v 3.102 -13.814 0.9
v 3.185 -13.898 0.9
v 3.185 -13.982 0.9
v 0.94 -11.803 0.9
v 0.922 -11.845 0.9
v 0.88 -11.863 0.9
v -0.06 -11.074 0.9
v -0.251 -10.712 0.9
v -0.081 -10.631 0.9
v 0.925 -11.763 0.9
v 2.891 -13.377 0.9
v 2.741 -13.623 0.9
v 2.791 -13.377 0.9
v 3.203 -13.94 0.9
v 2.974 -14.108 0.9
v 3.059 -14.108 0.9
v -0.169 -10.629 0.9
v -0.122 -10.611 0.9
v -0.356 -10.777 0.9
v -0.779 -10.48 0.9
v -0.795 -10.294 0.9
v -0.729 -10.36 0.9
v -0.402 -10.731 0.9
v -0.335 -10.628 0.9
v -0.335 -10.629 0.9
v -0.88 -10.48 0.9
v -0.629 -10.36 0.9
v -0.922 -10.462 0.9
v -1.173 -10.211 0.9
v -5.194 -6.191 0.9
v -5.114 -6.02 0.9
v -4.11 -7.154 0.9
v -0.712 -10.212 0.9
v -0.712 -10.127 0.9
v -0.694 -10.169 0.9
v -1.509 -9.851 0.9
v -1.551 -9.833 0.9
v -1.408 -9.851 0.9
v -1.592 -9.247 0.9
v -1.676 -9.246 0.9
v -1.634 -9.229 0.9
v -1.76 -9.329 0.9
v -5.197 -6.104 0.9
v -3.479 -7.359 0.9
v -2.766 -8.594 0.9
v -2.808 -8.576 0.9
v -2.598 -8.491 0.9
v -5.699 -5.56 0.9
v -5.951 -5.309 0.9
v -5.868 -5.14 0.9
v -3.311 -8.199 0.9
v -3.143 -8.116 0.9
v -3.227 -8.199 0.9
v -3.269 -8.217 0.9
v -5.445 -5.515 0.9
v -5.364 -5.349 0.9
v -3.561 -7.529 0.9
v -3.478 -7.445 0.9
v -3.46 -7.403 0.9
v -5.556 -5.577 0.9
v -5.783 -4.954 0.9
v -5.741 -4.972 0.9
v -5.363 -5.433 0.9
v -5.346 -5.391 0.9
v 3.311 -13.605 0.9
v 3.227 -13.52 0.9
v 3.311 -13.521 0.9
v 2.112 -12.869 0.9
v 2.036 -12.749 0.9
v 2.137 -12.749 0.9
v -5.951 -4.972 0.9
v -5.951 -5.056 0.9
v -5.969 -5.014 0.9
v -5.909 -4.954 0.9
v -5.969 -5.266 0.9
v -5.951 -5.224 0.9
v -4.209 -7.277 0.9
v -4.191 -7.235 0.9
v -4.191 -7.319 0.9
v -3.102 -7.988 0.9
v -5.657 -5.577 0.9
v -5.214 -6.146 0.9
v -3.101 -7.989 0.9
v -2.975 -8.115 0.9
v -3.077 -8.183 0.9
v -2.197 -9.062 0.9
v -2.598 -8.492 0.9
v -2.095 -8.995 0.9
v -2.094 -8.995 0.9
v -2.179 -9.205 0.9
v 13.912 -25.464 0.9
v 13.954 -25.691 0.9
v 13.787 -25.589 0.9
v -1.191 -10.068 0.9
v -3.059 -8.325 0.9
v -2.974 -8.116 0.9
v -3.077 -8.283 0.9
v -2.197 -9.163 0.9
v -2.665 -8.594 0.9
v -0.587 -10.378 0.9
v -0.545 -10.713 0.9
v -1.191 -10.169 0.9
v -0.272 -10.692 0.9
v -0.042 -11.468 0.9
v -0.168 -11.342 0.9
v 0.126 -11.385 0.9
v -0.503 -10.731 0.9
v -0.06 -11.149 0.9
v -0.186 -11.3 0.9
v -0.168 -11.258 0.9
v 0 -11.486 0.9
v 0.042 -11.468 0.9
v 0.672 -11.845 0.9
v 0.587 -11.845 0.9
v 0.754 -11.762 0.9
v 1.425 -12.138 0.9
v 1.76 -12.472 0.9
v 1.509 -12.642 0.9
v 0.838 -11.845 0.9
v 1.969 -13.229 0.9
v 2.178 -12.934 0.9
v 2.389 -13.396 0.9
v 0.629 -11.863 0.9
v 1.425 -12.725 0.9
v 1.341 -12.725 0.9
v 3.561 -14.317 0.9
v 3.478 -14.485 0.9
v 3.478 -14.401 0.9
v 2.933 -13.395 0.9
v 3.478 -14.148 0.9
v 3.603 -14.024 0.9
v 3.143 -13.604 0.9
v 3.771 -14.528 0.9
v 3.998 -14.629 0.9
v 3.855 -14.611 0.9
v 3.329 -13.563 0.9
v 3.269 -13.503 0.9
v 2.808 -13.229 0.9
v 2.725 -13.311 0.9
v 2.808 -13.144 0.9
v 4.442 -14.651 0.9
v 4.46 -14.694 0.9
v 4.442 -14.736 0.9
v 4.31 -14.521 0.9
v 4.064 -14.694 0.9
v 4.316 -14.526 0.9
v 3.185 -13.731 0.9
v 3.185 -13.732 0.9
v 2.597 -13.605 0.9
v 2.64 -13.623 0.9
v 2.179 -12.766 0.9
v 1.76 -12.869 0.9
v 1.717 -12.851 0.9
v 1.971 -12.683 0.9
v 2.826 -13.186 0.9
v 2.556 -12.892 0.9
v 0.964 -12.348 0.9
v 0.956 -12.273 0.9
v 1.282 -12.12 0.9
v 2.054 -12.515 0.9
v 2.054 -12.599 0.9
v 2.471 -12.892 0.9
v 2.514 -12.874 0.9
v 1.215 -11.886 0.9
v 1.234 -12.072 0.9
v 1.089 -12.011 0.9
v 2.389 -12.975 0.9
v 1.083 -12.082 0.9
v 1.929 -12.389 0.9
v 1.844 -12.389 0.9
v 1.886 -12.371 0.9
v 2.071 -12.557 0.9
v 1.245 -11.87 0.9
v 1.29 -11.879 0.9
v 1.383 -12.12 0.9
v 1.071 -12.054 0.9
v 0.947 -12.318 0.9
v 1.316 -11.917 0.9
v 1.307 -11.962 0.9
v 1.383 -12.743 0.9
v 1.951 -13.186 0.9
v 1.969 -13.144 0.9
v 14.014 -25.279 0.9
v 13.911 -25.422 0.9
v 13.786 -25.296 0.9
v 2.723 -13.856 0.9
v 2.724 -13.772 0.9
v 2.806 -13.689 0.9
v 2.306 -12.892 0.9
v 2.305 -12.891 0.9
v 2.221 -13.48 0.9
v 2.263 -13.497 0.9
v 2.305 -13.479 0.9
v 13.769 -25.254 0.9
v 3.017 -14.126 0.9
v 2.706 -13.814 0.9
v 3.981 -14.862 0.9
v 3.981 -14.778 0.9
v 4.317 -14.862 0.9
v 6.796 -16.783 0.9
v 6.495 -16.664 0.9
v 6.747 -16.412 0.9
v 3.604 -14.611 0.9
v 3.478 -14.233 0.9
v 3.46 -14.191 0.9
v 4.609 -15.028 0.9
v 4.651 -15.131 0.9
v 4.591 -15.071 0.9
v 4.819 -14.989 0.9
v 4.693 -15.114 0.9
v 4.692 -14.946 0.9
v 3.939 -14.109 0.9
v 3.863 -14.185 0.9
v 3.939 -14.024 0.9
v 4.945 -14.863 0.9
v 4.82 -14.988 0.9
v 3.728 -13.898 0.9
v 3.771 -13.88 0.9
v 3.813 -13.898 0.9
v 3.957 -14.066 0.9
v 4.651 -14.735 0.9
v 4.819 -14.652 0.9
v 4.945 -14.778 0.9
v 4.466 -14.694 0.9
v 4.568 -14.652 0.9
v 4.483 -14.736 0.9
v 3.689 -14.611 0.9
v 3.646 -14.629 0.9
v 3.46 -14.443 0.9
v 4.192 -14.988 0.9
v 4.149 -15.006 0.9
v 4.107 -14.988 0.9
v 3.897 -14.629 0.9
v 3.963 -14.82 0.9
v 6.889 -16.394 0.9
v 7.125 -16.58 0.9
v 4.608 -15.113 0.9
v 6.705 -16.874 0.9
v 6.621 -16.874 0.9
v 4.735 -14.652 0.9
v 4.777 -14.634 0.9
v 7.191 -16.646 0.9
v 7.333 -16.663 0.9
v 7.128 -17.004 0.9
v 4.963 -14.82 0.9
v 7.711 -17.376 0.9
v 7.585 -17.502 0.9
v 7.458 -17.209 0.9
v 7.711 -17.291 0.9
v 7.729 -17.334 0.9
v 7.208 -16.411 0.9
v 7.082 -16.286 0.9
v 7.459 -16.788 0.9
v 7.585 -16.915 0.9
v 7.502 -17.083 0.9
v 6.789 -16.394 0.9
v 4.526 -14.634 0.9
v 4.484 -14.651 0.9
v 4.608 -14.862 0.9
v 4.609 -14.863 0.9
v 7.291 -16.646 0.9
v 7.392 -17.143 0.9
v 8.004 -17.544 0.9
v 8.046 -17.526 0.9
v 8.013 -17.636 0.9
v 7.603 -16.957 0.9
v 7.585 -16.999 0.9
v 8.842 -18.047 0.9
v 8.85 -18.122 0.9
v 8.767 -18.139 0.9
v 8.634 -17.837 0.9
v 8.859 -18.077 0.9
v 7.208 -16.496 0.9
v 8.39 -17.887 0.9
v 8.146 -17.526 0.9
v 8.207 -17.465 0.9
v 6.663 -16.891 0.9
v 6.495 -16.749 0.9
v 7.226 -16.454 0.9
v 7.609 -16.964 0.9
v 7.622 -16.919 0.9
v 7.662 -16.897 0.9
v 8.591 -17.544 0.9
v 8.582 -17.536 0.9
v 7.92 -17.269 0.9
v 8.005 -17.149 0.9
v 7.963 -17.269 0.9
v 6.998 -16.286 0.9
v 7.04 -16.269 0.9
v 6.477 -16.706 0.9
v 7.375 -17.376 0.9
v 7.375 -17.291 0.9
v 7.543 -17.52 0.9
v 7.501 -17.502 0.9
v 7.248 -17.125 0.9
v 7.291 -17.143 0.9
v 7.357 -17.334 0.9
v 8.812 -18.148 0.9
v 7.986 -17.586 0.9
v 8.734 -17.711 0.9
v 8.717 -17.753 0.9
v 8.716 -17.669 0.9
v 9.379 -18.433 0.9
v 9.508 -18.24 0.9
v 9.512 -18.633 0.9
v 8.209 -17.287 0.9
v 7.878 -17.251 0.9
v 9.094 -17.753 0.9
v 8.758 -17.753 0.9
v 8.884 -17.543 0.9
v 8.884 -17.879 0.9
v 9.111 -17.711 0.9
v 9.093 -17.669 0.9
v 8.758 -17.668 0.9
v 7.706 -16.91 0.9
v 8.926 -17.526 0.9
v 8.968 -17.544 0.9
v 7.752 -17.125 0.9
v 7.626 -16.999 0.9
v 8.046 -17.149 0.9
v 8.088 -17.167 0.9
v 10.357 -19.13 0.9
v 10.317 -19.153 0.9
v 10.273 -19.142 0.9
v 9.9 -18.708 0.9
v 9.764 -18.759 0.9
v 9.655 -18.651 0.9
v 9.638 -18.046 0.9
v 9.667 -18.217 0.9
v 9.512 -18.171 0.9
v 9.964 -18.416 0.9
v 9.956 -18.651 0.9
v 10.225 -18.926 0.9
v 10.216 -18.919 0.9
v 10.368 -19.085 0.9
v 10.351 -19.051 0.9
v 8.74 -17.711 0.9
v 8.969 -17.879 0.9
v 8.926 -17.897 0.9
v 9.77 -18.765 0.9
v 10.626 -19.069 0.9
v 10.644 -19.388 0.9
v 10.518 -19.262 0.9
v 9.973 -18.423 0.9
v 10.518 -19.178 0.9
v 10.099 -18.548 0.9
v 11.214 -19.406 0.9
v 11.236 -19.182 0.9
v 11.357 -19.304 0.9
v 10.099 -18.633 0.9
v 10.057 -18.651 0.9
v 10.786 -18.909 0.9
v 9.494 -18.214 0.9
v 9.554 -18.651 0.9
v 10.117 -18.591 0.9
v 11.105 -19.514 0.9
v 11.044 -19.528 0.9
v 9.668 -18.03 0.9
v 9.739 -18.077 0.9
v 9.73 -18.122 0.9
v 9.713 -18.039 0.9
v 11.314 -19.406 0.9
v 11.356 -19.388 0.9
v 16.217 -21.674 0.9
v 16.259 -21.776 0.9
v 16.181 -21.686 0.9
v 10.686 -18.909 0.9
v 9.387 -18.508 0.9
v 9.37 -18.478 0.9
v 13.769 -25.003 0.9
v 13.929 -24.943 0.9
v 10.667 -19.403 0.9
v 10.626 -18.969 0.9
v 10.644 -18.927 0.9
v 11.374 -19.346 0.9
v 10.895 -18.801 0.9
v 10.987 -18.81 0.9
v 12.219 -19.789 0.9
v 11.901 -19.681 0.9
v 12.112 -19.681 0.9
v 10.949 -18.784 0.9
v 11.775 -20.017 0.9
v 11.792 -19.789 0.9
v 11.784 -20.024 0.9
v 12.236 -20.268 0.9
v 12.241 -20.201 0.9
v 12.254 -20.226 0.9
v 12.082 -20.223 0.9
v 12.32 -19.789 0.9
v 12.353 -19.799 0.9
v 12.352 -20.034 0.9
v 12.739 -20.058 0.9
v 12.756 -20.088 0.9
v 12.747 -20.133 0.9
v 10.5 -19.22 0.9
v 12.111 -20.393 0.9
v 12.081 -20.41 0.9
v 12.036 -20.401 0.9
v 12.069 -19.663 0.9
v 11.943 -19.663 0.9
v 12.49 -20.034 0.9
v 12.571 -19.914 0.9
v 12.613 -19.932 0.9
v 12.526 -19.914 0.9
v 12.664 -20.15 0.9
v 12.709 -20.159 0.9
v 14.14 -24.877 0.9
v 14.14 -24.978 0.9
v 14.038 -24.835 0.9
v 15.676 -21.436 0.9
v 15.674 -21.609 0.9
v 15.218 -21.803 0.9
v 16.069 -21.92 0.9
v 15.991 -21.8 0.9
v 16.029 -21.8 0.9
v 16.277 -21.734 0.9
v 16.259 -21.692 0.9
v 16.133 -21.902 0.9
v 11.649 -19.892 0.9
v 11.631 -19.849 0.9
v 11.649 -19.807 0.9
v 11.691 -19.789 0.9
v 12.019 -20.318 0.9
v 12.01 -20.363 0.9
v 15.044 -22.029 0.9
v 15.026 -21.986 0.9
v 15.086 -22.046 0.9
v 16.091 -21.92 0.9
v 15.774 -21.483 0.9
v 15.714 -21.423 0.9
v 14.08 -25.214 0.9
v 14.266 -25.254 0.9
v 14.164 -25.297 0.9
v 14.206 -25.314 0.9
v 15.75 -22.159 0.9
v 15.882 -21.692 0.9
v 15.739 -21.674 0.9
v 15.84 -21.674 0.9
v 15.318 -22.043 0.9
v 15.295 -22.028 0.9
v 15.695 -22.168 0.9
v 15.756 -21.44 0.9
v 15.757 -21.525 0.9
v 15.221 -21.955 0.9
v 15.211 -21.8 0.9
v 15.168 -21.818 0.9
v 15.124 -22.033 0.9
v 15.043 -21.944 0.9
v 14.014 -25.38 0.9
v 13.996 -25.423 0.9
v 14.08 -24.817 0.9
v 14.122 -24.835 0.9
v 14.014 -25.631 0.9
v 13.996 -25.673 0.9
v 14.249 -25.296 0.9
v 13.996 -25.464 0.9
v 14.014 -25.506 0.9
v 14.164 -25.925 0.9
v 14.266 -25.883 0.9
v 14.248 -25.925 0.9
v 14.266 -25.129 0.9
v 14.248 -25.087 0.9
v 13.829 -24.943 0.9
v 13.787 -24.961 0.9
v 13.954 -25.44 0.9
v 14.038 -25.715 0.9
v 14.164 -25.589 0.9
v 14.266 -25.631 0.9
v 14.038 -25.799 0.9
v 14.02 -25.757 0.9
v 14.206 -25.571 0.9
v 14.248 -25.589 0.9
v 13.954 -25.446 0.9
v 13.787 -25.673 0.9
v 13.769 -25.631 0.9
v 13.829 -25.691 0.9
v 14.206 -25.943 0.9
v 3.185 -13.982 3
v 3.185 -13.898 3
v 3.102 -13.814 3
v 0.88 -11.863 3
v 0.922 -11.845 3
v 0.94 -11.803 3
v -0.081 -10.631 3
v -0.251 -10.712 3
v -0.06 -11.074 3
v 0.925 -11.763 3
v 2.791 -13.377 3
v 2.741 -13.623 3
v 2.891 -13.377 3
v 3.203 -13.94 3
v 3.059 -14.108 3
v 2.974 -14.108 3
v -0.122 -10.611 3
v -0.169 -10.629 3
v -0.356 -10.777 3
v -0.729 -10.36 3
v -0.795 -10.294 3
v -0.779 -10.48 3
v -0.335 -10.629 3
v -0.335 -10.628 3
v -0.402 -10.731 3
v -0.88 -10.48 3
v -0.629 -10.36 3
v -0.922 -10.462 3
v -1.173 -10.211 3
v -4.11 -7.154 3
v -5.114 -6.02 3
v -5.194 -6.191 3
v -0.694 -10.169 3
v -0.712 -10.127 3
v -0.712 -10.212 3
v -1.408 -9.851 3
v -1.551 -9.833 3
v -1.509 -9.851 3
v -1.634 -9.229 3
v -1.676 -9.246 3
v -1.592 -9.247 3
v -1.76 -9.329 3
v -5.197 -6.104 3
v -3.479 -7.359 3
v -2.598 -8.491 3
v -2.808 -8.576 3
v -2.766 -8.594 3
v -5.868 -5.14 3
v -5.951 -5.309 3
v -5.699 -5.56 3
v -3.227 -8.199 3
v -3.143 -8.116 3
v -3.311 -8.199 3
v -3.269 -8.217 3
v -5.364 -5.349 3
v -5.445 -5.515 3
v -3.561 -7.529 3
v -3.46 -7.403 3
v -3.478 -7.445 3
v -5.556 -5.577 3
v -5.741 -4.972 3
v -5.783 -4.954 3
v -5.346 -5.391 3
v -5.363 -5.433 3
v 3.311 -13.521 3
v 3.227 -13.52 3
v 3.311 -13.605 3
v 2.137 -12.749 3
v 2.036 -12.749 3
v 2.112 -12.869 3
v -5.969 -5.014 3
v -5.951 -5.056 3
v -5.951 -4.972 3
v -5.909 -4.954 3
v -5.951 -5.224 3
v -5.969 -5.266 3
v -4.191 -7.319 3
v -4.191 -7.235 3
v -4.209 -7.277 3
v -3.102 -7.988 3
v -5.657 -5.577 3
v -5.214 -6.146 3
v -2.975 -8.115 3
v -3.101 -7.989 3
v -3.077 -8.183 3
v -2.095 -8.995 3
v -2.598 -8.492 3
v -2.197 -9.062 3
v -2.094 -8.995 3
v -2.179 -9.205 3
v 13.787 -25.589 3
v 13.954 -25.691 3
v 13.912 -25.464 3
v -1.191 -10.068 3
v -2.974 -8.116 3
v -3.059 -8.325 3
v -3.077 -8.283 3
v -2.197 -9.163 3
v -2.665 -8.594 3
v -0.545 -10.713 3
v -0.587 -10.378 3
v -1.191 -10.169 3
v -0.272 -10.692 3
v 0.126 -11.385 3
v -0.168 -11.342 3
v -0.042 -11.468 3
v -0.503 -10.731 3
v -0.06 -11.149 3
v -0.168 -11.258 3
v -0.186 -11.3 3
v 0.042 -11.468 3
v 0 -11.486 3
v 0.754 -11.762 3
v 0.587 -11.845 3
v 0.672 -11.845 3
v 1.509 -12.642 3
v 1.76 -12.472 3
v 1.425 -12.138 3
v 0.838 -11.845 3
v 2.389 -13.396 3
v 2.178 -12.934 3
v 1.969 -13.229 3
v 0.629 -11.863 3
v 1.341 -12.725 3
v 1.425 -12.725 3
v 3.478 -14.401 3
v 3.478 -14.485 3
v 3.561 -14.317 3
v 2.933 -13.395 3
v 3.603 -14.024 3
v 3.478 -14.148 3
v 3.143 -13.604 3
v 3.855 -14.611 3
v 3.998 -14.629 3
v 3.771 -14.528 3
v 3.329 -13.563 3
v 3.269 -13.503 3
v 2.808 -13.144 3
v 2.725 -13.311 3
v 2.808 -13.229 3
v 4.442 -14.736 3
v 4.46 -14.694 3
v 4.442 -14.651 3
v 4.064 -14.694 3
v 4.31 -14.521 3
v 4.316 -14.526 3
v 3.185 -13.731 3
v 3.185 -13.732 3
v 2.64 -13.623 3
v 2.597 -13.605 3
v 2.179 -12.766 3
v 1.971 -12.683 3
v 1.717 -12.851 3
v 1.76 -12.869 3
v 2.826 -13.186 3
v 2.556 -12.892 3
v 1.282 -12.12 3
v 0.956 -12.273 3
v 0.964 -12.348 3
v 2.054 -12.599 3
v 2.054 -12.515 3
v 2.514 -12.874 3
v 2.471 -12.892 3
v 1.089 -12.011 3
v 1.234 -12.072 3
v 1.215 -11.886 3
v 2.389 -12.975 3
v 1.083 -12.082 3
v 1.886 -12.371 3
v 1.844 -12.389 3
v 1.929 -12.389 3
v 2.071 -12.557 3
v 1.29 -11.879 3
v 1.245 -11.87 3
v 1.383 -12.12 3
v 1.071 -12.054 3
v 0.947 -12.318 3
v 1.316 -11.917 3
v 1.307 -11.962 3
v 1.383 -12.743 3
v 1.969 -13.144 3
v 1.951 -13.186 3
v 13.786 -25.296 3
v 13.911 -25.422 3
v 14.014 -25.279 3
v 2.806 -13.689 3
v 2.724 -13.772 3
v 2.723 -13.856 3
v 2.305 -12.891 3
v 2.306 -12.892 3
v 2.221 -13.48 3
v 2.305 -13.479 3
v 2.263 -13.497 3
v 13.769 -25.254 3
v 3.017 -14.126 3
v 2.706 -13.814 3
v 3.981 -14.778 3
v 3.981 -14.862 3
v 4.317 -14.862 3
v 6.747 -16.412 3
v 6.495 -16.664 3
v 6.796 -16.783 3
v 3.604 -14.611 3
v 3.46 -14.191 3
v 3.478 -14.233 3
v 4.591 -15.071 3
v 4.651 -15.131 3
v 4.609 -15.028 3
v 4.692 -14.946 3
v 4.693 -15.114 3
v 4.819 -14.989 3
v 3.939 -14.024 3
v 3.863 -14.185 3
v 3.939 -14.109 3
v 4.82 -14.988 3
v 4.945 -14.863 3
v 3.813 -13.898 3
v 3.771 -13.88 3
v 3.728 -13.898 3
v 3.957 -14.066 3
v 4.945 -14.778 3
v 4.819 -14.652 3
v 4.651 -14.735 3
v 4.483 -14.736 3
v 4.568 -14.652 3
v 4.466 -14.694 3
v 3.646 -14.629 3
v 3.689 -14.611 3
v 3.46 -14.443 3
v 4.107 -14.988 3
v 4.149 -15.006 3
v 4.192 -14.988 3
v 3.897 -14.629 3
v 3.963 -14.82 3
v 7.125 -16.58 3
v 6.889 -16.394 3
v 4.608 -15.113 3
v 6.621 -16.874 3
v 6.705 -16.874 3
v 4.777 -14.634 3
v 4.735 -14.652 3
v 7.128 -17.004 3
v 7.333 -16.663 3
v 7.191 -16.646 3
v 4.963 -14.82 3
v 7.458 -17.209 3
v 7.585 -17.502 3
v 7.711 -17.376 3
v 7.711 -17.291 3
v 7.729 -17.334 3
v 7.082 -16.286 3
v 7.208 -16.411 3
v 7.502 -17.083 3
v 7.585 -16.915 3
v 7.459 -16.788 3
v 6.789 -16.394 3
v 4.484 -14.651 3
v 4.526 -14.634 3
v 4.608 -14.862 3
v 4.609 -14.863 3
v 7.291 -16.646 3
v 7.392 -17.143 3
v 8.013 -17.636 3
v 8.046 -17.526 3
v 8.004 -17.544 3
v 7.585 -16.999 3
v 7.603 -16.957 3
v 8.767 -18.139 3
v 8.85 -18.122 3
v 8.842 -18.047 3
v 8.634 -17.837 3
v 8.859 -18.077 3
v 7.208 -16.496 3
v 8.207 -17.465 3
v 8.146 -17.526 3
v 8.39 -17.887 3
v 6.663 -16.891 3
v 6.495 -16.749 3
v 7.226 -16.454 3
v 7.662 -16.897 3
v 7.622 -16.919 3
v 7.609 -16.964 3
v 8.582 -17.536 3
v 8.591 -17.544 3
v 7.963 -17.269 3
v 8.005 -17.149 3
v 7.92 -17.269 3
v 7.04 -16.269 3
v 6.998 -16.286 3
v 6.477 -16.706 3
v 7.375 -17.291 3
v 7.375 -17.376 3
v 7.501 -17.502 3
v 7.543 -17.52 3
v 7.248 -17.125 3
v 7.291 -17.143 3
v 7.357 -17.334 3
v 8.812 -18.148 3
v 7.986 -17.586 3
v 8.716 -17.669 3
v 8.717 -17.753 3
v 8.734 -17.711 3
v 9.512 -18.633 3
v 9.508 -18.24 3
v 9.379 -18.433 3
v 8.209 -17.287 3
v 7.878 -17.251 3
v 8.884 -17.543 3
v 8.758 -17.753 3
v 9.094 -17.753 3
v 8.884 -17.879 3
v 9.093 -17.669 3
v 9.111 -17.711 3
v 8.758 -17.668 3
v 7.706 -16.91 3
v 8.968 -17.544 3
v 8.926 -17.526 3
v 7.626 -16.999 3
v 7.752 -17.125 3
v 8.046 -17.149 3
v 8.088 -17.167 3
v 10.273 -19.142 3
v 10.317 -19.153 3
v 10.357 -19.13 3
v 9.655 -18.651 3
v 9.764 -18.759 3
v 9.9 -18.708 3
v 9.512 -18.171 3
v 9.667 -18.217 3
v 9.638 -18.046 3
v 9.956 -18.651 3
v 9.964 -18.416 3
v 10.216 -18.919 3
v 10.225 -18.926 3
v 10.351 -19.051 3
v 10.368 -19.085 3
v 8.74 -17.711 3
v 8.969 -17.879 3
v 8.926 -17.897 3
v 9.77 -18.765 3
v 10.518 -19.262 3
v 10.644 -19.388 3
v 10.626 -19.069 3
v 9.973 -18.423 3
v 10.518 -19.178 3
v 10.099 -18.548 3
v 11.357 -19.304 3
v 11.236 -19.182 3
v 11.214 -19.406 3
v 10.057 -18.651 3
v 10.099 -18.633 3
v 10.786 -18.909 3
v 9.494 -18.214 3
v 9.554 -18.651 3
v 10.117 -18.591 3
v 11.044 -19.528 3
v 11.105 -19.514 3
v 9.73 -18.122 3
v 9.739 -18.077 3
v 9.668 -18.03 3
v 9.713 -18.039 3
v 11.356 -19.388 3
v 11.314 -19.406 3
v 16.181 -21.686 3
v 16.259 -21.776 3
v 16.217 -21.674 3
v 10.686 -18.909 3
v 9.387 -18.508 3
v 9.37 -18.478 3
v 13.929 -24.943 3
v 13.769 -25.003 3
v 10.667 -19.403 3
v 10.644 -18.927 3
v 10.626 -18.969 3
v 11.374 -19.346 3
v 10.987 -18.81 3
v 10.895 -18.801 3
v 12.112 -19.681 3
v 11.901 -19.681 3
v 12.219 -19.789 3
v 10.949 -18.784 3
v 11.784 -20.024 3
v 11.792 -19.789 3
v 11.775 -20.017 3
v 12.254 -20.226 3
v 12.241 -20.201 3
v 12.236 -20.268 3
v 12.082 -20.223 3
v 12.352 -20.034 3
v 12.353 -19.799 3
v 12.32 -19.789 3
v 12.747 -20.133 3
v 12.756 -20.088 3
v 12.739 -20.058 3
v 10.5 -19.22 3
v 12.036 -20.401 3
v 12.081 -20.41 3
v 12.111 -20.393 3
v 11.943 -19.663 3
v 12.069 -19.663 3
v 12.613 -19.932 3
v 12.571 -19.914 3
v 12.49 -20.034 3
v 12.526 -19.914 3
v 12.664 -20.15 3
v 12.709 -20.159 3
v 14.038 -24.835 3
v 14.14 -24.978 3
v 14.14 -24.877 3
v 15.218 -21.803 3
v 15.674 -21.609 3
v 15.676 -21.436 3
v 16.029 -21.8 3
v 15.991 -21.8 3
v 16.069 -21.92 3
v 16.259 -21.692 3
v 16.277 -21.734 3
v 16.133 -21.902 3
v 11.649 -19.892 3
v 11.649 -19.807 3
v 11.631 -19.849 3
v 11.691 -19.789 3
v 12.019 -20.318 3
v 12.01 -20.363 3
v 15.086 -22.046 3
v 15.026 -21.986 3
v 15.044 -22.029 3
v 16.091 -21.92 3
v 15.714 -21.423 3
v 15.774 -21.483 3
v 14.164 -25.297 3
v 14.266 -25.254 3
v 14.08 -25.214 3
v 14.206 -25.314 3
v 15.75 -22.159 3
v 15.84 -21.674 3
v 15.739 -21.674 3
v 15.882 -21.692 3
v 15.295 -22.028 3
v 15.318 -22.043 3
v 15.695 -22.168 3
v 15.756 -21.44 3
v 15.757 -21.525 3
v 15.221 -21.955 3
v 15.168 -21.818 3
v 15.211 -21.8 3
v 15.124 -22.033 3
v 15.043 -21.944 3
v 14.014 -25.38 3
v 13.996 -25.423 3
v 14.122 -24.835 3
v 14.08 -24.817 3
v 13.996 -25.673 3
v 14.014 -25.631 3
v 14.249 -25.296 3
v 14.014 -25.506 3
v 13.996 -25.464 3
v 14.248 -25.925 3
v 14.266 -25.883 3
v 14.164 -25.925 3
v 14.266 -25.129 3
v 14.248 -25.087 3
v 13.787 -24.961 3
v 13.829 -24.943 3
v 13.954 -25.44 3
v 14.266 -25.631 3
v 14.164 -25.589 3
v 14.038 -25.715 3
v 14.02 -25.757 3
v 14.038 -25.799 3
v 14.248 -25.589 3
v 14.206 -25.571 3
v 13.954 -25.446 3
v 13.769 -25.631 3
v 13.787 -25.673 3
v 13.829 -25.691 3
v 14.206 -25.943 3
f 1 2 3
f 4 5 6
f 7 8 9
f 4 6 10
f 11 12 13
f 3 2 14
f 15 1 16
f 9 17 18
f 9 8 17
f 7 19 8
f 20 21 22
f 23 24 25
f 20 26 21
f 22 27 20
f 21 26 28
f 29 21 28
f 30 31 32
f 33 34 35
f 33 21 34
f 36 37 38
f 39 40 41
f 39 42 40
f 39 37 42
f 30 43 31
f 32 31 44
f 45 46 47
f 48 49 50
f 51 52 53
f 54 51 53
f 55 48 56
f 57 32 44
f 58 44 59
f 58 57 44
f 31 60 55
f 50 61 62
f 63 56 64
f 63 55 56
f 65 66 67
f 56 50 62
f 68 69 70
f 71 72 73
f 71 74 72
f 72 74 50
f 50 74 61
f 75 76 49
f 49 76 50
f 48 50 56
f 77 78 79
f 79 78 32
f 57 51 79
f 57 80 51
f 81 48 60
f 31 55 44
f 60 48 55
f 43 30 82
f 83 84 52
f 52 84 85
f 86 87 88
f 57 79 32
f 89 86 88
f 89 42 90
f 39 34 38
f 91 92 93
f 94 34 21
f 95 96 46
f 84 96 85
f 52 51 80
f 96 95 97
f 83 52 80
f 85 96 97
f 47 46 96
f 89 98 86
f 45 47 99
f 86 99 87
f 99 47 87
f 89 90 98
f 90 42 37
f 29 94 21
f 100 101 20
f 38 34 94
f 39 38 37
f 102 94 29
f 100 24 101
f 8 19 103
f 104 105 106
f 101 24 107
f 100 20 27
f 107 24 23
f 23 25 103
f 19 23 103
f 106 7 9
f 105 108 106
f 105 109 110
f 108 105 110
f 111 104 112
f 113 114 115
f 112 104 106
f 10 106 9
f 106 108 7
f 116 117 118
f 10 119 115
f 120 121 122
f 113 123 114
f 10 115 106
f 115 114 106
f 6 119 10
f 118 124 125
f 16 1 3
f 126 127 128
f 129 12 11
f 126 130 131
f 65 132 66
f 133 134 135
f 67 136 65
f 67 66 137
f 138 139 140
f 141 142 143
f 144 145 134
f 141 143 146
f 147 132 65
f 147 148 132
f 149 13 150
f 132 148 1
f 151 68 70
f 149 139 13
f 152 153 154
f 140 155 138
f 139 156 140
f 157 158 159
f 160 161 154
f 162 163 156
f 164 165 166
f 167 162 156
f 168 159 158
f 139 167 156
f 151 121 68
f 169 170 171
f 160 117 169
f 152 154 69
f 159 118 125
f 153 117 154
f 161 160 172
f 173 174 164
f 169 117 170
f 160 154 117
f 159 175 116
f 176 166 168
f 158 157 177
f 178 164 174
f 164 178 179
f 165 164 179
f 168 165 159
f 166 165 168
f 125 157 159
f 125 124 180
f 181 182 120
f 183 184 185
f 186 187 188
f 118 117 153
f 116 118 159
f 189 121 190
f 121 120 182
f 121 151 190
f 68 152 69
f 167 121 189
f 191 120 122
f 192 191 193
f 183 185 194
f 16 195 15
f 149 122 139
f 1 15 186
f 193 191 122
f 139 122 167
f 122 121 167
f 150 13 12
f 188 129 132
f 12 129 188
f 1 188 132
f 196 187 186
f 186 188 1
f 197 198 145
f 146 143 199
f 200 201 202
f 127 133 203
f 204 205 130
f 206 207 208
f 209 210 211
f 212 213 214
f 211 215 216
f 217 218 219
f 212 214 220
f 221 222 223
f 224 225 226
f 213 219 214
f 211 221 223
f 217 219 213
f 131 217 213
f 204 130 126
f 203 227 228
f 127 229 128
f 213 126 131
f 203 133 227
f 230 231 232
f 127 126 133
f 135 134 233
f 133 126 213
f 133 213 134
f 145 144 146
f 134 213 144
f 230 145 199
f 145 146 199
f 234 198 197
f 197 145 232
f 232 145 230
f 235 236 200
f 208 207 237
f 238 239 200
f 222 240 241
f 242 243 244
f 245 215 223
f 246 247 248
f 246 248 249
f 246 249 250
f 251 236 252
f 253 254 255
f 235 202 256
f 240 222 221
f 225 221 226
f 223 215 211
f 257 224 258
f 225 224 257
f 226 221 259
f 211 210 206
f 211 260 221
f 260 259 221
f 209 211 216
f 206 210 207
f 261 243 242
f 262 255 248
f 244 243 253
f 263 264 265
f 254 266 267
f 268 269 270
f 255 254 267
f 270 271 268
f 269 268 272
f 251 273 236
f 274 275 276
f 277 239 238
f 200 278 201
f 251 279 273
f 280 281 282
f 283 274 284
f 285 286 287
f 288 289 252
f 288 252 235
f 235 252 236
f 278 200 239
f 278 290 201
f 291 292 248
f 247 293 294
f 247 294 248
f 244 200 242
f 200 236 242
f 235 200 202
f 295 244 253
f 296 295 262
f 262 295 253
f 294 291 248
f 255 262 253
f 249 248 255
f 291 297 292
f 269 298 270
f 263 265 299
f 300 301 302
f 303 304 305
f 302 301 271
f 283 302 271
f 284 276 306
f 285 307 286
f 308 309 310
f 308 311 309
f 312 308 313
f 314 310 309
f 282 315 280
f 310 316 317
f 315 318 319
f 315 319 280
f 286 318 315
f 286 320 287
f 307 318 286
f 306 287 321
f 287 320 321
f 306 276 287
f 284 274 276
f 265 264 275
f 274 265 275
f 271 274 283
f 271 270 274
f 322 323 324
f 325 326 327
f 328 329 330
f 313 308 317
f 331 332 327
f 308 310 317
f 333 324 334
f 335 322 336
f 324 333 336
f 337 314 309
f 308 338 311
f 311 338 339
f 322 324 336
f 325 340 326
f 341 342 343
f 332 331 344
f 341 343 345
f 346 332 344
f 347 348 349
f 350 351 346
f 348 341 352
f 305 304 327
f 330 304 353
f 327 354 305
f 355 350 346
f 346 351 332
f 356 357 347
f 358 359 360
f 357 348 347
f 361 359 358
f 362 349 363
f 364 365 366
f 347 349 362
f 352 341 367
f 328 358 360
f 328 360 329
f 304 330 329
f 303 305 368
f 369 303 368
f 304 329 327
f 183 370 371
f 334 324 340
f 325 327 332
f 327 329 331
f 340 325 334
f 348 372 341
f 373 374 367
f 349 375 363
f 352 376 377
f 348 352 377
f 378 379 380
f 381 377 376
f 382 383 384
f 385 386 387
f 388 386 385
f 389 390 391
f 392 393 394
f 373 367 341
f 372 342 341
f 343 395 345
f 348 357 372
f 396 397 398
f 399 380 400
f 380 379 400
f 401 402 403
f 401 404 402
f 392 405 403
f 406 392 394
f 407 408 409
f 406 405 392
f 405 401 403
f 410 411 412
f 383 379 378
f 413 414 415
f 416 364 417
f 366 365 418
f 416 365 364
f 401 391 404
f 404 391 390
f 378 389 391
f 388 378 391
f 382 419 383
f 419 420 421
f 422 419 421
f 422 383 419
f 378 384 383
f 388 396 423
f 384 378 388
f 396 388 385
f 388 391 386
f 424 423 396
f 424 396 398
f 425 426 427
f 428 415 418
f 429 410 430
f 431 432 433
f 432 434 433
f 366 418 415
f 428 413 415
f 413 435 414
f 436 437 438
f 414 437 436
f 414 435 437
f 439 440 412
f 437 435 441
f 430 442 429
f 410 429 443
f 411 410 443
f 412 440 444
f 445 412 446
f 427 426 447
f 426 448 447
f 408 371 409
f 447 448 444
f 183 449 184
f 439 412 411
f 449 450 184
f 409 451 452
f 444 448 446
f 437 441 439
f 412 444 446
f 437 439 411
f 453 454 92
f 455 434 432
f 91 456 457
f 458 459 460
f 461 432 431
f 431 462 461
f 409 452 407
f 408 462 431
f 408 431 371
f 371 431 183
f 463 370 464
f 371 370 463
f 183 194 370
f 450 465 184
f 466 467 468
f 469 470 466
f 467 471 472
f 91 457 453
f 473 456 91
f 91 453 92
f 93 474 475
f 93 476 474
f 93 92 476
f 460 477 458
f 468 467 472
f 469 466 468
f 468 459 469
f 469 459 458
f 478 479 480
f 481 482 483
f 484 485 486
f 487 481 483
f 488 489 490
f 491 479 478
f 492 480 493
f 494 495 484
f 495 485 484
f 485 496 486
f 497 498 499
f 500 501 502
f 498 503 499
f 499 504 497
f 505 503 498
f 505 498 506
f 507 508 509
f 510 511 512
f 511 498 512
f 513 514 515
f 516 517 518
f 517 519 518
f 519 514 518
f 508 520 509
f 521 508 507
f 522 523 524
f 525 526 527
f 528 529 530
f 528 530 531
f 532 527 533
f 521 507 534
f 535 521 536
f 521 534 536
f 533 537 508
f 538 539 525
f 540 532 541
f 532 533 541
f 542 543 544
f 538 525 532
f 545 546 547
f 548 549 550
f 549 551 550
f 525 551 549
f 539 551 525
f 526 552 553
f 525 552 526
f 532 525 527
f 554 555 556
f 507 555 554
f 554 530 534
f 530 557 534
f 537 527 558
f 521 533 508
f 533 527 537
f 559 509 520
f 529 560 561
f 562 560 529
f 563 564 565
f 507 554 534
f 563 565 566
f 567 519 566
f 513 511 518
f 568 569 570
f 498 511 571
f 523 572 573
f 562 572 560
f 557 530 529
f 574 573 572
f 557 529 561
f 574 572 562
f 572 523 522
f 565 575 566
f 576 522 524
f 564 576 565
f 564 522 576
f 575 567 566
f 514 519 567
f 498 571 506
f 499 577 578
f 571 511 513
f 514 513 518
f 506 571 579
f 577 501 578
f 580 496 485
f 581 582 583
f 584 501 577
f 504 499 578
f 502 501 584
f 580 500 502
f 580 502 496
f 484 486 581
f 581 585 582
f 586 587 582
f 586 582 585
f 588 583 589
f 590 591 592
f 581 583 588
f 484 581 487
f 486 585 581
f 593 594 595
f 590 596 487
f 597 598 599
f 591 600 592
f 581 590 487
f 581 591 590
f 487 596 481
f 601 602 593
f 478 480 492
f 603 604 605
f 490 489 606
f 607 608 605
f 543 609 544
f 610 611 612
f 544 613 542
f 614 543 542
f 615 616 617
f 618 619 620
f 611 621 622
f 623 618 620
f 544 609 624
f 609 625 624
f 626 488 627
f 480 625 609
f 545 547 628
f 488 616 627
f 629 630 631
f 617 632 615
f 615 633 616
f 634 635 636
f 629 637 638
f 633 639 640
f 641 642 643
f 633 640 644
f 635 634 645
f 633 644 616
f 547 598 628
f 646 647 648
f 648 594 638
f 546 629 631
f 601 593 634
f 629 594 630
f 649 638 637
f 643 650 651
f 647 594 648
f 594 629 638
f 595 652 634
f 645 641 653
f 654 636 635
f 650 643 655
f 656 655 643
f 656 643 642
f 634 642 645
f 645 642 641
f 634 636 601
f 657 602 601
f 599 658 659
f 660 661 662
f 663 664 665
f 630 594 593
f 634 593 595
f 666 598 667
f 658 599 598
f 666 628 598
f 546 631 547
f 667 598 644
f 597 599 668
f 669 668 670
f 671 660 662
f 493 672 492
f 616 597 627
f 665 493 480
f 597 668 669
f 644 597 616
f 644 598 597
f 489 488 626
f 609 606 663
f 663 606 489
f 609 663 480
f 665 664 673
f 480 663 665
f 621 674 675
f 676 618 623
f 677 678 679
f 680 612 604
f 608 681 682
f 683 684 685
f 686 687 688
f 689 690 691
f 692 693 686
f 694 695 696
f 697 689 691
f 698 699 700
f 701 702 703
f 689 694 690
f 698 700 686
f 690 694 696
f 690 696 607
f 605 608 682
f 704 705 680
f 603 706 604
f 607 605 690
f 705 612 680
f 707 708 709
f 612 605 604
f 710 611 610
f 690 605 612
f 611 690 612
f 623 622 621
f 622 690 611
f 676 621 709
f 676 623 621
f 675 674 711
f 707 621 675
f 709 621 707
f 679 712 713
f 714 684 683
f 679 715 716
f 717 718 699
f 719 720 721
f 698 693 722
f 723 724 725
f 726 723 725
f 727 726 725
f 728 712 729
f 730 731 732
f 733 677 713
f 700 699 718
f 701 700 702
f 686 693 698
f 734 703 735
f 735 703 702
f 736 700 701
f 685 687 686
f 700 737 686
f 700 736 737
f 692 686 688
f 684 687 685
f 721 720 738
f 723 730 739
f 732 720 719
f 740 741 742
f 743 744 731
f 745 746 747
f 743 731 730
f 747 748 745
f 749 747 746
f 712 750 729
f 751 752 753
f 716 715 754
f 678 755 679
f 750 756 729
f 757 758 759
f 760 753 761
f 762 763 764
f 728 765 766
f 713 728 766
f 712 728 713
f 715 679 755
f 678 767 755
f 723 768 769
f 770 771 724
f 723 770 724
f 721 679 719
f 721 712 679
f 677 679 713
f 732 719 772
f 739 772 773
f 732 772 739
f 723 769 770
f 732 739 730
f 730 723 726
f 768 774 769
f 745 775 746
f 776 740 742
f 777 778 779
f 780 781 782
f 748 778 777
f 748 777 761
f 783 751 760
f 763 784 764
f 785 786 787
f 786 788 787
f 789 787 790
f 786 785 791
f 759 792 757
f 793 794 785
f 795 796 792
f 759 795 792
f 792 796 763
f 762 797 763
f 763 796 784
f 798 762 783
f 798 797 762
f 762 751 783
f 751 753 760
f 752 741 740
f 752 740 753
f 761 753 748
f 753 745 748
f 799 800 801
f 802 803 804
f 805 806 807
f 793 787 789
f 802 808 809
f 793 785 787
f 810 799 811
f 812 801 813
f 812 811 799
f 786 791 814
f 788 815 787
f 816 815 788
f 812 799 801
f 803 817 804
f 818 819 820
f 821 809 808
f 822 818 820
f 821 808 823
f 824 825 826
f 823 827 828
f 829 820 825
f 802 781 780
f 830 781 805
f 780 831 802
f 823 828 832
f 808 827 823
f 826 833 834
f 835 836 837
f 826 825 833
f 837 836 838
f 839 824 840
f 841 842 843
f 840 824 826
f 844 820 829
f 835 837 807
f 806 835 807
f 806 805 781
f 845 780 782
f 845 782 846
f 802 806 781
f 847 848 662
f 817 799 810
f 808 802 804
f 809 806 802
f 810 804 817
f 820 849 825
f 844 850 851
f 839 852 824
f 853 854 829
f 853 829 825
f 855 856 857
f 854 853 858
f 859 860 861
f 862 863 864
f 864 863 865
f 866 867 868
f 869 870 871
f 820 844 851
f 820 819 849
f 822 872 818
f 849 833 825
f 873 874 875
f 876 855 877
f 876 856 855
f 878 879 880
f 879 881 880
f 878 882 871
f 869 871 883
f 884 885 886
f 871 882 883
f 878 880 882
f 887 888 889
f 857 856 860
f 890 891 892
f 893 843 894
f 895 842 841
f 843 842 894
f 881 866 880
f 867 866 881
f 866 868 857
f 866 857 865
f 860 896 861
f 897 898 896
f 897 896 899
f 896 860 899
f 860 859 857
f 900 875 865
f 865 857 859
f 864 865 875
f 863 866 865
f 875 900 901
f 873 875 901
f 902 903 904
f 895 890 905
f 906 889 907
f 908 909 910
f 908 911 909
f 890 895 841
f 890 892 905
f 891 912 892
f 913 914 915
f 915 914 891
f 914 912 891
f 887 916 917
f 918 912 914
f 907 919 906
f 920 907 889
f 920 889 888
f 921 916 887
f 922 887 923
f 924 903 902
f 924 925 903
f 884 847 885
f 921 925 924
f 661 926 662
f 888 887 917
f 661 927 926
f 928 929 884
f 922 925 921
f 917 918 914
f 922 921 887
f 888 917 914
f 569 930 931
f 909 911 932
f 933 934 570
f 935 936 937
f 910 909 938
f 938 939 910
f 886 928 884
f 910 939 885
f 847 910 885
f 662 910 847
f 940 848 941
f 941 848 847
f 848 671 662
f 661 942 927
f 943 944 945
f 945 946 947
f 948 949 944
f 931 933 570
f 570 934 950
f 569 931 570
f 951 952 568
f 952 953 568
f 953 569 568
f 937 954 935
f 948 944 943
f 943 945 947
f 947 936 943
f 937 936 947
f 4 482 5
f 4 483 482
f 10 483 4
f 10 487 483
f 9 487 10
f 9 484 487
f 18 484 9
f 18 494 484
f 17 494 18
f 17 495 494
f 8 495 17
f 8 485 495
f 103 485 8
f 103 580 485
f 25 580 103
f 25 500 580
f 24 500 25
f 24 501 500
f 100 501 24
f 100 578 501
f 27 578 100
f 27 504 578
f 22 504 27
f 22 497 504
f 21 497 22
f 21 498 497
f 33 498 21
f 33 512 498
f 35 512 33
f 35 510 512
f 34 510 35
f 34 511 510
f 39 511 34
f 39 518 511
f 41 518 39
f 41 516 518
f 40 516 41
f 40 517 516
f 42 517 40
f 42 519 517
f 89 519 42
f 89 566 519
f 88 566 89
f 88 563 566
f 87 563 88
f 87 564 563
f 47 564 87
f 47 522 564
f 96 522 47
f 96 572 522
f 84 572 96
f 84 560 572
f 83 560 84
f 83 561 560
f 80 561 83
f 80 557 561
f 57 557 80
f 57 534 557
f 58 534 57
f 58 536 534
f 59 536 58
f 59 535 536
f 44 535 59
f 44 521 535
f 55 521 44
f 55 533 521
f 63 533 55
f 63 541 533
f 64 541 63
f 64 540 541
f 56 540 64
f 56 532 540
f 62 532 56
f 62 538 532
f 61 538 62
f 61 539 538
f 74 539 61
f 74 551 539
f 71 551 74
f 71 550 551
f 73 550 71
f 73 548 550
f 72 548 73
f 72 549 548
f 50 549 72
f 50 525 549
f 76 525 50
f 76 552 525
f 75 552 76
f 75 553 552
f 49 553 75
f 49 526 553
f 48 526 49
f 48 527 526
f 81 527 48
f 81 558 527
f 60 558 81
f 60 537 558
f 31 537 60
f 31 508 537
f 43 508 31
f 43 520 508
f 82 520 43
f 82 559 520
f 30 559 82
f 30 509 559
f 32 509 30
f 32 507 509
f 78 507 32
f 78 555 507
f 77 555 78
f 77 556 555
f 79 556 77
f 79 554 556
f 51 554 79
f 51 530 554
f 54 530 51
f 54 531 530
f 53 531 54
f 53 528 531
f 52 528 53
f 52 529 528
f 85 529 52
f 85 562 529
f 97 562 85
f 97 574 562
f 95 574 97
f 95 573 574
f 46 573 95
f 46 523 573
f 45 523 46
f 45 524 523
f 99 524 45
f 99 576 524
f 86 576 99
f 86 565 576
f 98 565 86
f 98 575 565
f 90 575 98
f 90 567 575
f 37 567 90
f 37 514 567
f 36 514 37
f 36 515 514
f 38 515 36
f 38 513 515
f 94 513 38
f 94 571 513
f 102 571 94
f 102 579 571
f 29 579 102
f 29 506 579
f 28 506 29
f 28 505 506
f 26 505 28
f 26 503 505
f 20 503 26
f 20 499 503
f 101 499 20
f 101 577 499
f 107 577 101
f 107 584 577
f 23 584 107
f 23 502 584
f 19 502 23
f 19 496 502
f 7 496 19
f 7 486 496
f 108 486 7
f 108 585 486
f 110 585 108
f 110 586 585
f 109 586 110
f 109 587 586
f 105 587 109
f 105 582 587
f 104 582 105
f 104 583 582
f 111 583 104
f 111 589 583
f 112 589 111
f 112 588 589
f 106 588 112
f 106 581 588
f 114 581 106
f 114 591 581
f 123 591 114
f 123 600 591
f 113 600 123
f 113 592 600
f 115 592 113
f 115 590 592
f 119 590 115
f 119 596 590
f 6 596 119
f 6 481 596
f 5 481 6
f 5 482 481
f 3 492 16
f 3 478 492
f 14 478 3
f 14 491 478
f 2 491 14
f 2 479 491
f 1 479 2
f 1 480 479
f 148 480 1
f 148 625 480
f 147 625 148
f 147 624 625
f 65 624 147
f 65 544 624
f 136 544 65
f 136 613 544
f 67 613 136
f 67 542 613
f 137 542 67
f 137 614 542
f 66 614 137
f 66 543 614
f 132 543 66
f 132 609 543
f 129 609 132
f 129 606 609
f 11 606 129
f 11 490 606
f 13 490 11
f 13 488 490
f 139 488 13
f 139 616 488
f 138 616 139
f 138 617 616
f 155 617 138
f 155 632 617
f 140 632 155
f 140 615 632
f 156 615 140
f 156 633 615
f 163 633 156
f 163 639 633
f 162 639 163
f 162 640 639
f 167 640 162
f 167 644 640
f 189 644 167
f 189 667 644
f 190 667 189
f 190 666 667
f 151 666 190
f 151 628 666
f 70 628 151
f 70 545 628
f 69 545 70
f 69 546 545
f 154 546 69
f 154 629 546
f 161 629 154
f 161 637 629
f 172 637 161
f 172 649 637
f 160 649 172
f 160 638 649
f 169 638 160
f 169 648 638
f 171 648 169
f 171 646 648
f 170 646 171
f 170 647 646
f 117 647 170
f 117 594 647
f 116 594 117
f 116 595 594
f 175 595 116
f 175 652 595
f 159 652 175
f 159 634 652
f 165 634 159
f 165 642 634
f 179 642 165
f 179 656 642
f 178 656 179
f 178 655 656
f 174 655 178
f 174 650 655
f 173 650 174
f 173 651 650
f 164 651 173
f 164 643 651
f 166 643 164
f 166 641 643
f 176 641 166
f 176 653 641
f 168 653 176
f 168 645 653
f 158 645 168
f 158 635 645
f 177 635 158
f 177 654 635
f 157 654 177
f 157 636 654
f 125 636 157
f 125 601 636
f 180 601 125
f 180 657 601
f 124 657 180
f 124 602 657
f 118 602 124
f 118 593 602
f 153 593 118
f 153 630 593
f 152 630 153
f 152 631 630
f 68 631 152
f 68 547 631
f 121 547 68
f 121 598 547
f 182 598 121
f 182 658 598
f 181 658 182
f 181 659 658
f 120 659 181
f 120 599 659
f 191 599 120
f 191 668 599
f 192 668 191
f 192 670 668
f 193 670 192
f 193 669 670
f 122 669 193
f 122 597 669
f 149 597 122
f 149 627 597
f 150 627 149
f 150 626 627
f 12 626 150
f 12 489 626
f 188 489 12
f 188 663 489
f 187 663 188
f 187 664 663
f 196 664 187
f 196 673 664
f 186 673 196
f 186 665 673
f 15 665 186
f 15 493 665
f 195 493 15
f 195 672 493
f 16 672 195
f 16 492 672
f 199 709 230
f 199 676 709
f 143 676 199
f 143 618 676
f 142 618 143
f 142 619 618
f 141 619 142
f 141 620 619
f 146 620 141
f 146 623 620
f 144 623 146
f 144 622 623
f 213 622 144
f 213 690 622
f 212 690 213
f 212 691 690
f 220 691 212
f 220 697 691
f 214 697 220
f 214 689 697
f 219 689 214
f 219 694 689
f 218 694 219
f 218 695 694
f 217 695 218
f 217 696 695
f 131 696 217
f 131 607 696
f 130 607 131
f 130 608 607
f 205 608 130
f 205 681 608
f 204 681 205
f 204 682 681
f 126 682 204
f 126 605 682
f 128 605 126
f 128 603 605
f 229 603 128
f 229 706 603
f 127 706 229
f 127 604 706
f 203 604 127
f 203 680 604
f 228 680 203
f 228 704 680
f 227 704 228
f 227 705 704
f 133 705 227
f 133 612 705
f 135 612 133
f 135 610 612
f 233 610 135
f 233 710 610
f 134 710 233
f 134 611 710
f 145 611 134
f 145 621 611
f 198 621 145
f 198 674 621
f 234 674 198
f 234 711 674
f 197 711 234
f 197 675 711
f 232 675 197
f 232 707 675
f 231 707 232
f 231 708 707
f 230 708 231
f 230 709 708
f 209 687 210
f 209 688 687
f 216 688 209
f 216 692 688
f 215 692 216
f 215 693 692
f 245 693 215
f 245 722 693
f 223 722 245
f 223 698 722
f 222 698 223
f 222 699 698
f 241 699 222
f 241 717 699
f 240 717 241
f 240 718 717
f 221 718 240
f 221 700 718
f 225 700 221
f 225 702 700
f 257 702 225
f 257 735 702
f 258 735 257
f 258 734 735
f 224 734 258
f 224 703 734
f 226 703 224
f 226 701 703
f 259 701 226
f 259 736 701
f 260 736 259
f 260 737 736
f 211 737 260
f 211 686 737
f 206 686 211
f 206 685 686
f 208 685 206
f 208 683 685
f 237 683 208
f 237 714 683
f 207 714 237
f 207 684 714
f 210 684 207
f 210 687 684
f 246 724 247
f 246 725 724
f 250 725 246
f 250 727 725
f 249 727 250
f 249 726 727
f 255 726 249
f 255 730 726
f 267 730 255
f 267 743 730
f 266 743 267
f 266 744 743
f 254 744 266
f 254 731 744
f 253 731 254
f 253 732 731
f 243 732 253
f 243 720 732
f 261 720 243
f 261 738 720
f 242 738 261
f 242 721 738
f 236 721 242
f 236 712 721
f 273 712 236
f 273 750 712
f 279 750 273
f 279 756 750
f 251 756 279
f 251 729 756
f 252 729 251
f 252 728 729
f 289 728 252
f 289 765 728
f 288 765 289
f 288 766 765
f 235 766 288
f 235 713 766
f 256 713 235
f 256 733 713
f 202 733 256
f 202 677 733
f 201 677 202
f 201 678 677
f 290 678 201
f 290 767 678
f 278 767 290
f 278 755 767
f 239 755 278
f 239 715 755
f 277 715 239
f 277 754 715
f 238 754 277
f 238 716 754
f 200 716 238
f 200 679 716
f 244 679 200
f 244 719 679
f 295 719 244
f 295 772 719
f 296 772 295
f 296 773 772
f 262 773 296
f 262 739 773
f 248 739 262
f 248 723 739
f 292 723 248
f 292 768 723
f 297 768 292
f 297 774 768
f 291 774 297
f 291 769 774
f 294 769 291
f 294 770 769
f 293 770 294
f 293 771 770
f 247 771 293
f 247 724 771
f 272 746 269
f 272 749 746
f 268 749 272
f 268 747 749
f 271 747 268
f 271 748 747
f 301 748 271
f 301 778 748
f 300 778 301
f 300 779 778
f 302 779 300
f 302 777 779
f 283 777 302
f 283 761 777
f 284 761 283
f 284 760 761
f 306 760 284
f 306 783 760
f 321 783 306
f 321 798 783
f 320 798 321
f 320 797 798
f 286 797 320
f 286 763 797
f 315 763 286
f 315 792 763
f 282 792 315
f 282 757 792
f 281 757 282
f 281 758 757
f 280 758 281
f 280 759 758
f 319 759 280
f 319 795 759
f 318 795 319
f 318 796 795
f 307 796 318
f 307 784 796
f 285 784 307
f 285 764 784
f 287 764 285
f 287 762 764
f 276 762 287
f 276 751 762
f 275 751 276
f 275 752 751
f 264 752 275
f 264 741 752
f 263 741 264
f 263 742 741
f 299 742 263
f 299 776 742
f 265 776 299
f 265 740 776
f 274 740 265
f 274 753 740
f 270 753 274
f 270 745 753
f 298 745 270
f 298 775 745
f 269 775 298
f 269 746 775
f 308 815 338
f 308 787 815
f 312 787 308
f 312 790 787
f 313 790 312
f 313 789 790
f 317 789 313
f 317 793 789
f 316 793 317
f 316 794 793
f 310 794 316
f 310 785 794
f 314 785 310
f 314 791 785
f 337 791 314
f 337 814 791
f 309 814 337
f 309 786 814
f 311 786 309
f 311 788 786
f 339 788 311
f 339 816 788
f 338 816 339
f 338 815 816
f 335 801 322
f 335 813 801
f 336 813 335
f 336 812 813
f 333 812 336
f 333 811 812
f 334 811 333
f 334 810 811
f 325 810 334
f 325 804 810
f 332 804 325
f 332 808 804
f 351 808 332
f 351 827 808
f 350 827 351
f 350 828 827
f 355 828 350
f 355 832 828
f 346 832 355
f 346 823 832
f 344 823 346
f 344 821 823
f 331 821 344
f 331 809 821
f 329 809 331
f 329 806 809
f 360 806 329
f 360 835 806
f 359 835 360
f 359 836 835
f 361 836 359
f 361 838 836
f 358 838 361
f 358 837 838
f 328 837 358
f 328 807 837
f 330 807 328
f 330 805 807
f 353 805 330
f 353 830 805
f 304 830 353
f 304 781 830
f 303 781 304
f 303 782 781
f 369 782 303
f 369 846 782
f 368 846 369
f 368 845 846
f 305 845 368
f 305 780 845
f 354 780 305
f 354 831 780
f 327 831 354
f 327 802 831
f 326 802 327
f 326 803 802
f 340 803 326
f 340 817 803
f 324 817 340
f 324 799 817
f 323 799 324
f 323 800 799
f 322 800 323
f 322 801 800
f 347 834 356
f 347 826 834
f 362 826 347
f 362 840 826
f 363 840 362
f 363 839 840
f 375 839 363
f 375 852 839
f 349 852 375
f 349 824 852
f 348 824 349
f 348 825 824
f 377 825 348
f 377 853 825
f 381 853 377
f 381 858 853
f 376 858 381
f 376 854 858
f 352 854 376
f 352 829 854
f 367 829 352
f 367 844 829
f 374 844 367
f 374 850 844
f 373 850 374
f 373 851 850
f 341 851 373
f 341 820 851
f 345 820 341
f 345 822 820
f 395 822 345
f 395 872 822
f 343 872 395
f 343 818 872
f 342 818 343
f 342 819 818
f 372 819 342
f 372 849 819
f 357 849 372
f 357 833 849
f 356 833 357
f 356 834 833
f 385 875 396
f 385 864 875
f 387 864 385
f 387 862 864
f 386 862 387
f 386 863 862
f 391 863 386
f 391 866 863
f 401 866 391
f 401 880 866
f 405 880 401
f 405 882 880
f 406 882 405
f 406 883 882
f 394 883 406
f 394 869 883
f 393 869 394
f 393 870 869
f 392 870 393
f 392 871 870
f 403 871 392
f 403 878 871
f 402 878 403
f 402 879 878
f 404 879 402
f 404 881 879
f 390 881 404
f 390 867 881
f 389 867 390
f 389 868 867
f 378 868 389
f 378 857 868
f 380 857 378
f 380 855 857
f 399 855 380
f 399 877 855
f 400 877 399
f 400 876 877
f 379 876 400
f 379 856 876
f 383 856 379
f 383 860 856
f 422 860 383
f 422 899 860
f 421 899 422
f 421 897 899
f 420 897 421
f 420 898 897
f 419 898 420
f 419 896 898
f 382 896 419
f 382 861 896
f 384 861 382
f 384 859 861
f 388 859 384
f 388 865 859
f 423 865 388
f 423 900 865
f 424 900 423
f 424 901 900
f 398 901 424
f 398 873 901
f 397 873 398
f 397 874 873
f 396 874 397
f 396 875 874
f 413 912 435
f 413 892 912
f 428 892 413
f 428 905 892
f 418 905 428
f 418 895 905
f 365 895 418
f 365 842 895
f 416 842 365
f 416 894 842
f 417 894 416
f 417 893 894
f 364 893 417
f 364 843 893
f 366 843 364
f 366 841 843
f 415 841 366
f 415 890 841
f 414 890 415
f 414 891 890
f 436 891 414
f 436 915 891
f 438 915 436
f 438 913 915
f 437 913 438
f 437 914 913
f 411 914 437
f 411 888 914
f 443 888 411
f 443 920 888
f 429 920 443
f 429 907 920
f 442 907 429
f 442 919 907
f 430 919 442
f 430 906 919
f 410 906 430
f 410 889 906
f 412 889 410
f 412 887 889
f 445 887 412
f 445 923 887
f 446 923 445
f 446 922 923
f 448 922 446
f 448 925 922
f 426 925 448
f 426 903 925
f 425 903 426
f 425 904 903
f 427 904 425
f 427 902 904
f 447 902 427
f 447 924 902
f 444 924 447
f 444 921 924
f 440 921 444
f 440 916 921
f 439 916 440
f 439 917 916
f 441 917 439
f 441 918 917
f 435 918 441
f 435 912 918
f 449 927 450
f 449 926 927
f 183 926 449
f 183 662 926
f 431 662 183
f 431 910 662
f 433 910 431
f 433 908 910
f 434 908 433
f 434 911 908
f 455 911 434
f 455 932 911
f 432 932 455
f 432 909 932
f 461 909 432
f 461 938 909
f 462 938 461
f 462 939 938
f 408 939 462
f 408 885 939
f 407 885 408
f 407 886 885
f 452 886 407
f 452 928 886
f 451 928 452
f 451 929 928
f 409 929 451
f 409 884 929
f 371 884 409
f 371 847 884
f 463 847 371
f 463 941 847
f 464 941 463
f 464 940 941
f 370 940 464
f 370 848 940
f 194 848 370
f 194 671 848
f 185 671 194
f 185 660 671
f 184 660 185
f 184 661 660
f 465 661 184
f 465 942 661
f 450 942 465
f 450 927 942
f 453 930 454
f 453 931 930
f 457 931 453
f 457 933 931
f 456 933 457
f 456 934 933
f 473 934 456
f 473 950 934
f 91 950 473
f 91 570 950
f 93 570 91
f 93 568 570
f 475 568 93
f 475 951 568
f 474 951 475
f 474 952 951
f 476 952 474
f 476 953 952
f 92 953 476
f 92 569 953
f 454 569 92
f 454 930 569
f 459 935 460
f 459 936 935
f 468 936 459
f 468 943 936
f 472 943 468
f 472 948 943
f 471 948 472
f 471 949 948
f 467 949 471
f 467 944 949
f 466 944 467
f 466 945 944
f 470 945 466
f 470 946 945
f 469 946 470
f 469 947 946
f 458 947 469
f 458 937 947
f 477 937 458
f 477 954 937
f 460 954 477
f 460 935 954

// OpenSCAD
$fn = 24;
translate([0, -2.500, 0.900])
  linear_extrude(height=2.100) {
offset(r=0.06, $fn=8) {
    polygon(points=[[14.457,-21.371],[14.583,-21.497],[14.457,-21.371],[14.331,-21.497],[14.331,-21.623],[14.206,-21.749],[14.206,-22.000],[14.080,-22.126],[14.080,-22.377],[13.954,-22.503],[13.829,-22.503],[13.703,-22.377],[13.577,-22.503],[13.703,-22.377],[13.829,-22.503],[13.829,-22.754],[13.703,-22.880],[13.829,-22.754],[13.954,-22.880],[13.954,-23.006],[13.829,-23.131],[13.954,-23.131],[14.206,-23.383],[14.080,-23.509],[14.206,-23.634],[14.080,-23.509],[14.206,-23.383],[14.206,-22.629],[14.080,-22.503],[14.080,-22.126],[14.206,-22.000],[14.331,-22.126],[14.206,-22.000],[14.206,-21.749],[14.331,-21.623],[14.457,-21.749],[14.331,-21.623],[14.331,-21.497],[14.080,-22.629],[14.206,-22.754],[14.206,-23.131],[14.080,-23.257],[13.954,-23.131],[13.954,-22.754]], paths=[[0,1,2,3,4,5,6,7,8,9,10,11,12,13,14,15,16,17,18,19,20,21,22,23,24,25,26,27,28,29,30,31,32,33,34,35,36,37],[38,39,40,41,42,43]]);
    polygon(points=[[15.714,-18.983],[15.086,-19.486],[15.211,-19.360],[15.337,-19.486],[15.714,-19.611],[15.840,-19.737],[15.714,-19.863],[15.840,-19.737],[15.714,-19.611],[16.217,-19.234],[16.091,-19.360],[15.966,-19.360],[15.840,-19.234],[15.966,-19.109],[15.840,-19.234],[15.714,-19.234],[15.589,-19.109]], paths=[[0,1,2,3,4,5,6,7,8,9,10,11,12,13,14,15,16]]);
    polygon(points=[[11.440,-17.474],[11.566,-17.349],[11.691,-17.349],[11.817,-17.474],[11.691,-17.600],[11.817,-17.474],[12.194,-17.726],[12.069,-17.851],[12.320,-17.474],[12.571,-17.474],[12.697,-17.600],[12.320,-17.349],[12.446,-17.223],[12.320,-17.349],[12.194,-17.349],[12.069,-17.223],[12.194,-17.097],[12.069,-17.223],[11.943,-17.223],[11.817,-17.097],[11.943,-16.971],[11.817,-17.097],[11.943,-17.223],[11.817,-17.349],[11.566,-17.349]], paths=[[0,1,2,3,4,5,6,7,8,9,10,11,12,13,14,15,16,17,18,19,20,21,22,23,24]]);
    polygon(points=[[9.554,-15.714],[9.680,-15.589],[9.429,-15.966],[9.554,-16.091],[9.429,-16.217],[9.554,-16.091],[9.680,-16.091],[9.806,-16.217],[9.680,-16.343],[9.806,-16.217],[10.183,-16.469],[10.057,-16.594],[10.183,-16.469],[10.309,-16.594],[10.434,-16.594],[10.560,-16.720],[10.434,-16.846],[10.560,-16.720],[10.686,-16.846],[11.063,-16.971],[11.189,-17.097],[11.063,-17.223],[11.189,-17.097],[11.063,-16.971],[11.189,-16.846],[11.440,-16.846],[11.566,-16.971],[11.440,-16.846],[11.566,-16.720],[11.440,-16.846],[11.314,-16.846],[11.189,-16.720],[11.314,-16.594],[11.189,-16.720],[10.937,-16.343],[10.811,-16.469],[10.686,-16.469],[10.560,-16.343],[10.686,-16.217],[10.560,-16.343],[10.686,-16.469],[10.686,-16.594],[10.560,-16.720],[10.434,-16.594],[10.309,-16.594],[9.806,-16.217],[9.931,-16.091],[10.183,-16.091],[10.309,-16.217],[10.183,-16.091],[10.309,-15.966],[10.183,-16.091],[10.057,-16.091],[9.931,-15.966],[10.057,-15.840],[9.931,-15.966]], paths=[[0,1,2,3,4,5,6,7,8,9,10,11,12,13,14,15,16,17,18,19,20,21,22,23,24,25,26,27,28,29,30,31,32,33,34,35,36,37,38,39,40,41,42,43,44,45,46,47,48,49,50,51,52,53,54,55]]);
    polygon(points=[[6.663,-13.829],[6.789,-13.954],[6.537,-14.206],[6.663,-14.331],[6.789,-14.206],[7.166,-14.457],[7.040,-14.583],[7.166,-14.457],[7.291,-14.583],[7.417,-14.583],[7.543,-14.709],[7.417,-14.834],[7.543,-14.960],[7.669,-14.834],[7.417,-14.583],[7.543,-14.457],[7.669,-14.457],[8.297,-14.960],[8.171,-15.086],[8.046,-15.086],[7.920,-14.960],[8.046,-15.086],[7.920,-15.211],[8.046,-15.086],[8.423,-15.337],[8.297,-15.463],[8.423,-15.337],[8.800,-15.589],[8.674,-15.714],[8.800,-15.589],[8.549,-15.337],[8.674,-15.211],[8.800,-15.211],[8.926,-15.337],[9.051,-15.211],[8.926,-15.086],[8.800,-15.211],[8.674,-15.211],[8.549,-15.086],[8.674,-14.960],[8.549,-15.086],[8.171,-14.834],[8.297,-14.709],[8.171,-14.834],[8.046,-14.709],[7.920,-14.709],[7.794,-14.583],[7.920,-14.457],[7.794,-14.583],[7.669,-14.457],[7.543,-14.457],[7.417,-14.331],[7.543,-14.206],[7.417,-14.331],[7.291,-14.206],[7.166,-14.206],[7.040,-14.080],[7.166,-13.954],[7.040,-13.829],[6.914,-13.954],[6.789,-13.954]], paths=[[0,1,2,3,4,5,6,7,8,9,10,11,12,13,14,15,16,17,18,19,20,21,22,23,24,25,26,27,28,29,30,31,32,33,34,35,36,37,38,39,40,41,42,43,44,45,46,47,48,49,50,51,52,53,54,55,56,57,58,59,60]]);
    polygon(points=[[3.520,-11.440],[3.646,-11.566],[3.520,-11.691],[3.646,-11.817],[3.520,-11.943],[3.646,-12.069],[3.771,-11.943],[3.897,-12.069],[4.023,-12.069],[4.149,-12.194],[4.023,-12.320],[4.149,-12.446],[4.274,-12.320],[4.400,-12.446],[4.274,-12.320],[4.400,-12.194],[4.526,-12.194],[4.777,-12.446],[4.651,-12.571],[4.777,-12.697],[4.651,-12.823],[4.777,-12.697],[4.903,-12.823],[4.651,-12.571],[4.903,-12.320],[4.777,-12.194],[4.651,-12.320],[4.526,-12.194],[4.400,-12.194],[4.274,-12.069],[4.400,-11.943],[4.274,-12.069],[3.771,-11.691],[3.897,-11.566],[3.771,-11.440],[3.646,-11.566]], paths=[[0,1,2,3,4,5,6,7,8,9,10,11,12,13,14,15,16,17,18,19,20,21,22,23,24,25,26,27,28,29,30,31,32,33,34,35]]);
    polygon(points=[[-6.034,-2.389],[-5.783,-2.640],[-5.909,-2.766],[-5.657,-3.017],[-5.531,-3.017],[-5.029,-3.520],[-5.154,-3.646],[-4.023,-4.651],[-4.149,-4.777],[-3.269,-5.657],[-3.143,-5.531],[-3.017,-5.657],[-3.017,-5.783],[-2.766,-6.034],[-2.640,-6.034],[-2.137,-6.537],[-2.137,-6.663],[-1.509,-7.291],[-1.383,-7.291],[-1.131,-7.543],[-1.131,-7.669],[-0.880,-7.920],[-0.754,-7.920],[-0.503,-8.171],[-0.377,-8.171],[0.000,-8.549],[0.000,-8.674],[-0.126,-8.800],[-0.377,-8.549],[0.000,-8.926],[0.126,-8.800],[0.629,-9.303],[0.754,-9.177],[0.880,-9.303],[1.006,-9.177],[1.257,-9.429],[1.006,-9.806],[1.383,-10.183],[1.509,-10.057],[1.760,-10.309],[2.137,-10.309],[2.263,-10.434],[2.011,-10.686],[2.263,-10.937],[2.389,-10.811],[2.640,-11.063],[2.766,-11.063],[2.891,-11.189],[2.766,-11.314],[3.017,-11.566],[3.143,-11.440],[3.017,-11.314],[3.269,-11.063],[3.143,-11.189],[2.891,-10.937],[2.766,-10.937],[2.640,-10.811],[2.766,-10.686],[2.514,-10.434],[2.389,-10.560],[2.137,-10.309],[2.011,-10.309],[1.886,-10.183],[2.011,-10.057],[1.886,-9.931],[1.760,-10.057],[1.383,-9.680],[1.257,-9.680],[1.131,-9.554],[1.257,-9.429],[1.006,-9.177],[0.880,-9.303],[-0.126,-8.171],[-0.251,-8.297],[-0.629,-7.920],[-0.754,-7.920],[-0.880,-7.794],[-0.754,-7.669],[-1.634,-6.789],[-1.760,-6.914],[-3.646,-5.029],[-3.520,-4.903],[-5.531,-3.017],[-5.406,-2.891],[-5.783,-2.514],[-5.909,-2.514]], paths=[[0,1,2,3,4,5,6,7,8,9,10,11,12,13,14,15,16,17,18,19,20,21,22,23,24,25,26,27,28,29,30,31,32,33,34,35,36,37,38,39,40,41,42,43,44,45,46,47,48,49,50,51,52,53,54,55,56,57,58,59,60,61,62,63,64,65,66,67,68,69,70,71,72,73,74,75,76,77,78,79,80,81,82,83,84,85]]);
}
}
